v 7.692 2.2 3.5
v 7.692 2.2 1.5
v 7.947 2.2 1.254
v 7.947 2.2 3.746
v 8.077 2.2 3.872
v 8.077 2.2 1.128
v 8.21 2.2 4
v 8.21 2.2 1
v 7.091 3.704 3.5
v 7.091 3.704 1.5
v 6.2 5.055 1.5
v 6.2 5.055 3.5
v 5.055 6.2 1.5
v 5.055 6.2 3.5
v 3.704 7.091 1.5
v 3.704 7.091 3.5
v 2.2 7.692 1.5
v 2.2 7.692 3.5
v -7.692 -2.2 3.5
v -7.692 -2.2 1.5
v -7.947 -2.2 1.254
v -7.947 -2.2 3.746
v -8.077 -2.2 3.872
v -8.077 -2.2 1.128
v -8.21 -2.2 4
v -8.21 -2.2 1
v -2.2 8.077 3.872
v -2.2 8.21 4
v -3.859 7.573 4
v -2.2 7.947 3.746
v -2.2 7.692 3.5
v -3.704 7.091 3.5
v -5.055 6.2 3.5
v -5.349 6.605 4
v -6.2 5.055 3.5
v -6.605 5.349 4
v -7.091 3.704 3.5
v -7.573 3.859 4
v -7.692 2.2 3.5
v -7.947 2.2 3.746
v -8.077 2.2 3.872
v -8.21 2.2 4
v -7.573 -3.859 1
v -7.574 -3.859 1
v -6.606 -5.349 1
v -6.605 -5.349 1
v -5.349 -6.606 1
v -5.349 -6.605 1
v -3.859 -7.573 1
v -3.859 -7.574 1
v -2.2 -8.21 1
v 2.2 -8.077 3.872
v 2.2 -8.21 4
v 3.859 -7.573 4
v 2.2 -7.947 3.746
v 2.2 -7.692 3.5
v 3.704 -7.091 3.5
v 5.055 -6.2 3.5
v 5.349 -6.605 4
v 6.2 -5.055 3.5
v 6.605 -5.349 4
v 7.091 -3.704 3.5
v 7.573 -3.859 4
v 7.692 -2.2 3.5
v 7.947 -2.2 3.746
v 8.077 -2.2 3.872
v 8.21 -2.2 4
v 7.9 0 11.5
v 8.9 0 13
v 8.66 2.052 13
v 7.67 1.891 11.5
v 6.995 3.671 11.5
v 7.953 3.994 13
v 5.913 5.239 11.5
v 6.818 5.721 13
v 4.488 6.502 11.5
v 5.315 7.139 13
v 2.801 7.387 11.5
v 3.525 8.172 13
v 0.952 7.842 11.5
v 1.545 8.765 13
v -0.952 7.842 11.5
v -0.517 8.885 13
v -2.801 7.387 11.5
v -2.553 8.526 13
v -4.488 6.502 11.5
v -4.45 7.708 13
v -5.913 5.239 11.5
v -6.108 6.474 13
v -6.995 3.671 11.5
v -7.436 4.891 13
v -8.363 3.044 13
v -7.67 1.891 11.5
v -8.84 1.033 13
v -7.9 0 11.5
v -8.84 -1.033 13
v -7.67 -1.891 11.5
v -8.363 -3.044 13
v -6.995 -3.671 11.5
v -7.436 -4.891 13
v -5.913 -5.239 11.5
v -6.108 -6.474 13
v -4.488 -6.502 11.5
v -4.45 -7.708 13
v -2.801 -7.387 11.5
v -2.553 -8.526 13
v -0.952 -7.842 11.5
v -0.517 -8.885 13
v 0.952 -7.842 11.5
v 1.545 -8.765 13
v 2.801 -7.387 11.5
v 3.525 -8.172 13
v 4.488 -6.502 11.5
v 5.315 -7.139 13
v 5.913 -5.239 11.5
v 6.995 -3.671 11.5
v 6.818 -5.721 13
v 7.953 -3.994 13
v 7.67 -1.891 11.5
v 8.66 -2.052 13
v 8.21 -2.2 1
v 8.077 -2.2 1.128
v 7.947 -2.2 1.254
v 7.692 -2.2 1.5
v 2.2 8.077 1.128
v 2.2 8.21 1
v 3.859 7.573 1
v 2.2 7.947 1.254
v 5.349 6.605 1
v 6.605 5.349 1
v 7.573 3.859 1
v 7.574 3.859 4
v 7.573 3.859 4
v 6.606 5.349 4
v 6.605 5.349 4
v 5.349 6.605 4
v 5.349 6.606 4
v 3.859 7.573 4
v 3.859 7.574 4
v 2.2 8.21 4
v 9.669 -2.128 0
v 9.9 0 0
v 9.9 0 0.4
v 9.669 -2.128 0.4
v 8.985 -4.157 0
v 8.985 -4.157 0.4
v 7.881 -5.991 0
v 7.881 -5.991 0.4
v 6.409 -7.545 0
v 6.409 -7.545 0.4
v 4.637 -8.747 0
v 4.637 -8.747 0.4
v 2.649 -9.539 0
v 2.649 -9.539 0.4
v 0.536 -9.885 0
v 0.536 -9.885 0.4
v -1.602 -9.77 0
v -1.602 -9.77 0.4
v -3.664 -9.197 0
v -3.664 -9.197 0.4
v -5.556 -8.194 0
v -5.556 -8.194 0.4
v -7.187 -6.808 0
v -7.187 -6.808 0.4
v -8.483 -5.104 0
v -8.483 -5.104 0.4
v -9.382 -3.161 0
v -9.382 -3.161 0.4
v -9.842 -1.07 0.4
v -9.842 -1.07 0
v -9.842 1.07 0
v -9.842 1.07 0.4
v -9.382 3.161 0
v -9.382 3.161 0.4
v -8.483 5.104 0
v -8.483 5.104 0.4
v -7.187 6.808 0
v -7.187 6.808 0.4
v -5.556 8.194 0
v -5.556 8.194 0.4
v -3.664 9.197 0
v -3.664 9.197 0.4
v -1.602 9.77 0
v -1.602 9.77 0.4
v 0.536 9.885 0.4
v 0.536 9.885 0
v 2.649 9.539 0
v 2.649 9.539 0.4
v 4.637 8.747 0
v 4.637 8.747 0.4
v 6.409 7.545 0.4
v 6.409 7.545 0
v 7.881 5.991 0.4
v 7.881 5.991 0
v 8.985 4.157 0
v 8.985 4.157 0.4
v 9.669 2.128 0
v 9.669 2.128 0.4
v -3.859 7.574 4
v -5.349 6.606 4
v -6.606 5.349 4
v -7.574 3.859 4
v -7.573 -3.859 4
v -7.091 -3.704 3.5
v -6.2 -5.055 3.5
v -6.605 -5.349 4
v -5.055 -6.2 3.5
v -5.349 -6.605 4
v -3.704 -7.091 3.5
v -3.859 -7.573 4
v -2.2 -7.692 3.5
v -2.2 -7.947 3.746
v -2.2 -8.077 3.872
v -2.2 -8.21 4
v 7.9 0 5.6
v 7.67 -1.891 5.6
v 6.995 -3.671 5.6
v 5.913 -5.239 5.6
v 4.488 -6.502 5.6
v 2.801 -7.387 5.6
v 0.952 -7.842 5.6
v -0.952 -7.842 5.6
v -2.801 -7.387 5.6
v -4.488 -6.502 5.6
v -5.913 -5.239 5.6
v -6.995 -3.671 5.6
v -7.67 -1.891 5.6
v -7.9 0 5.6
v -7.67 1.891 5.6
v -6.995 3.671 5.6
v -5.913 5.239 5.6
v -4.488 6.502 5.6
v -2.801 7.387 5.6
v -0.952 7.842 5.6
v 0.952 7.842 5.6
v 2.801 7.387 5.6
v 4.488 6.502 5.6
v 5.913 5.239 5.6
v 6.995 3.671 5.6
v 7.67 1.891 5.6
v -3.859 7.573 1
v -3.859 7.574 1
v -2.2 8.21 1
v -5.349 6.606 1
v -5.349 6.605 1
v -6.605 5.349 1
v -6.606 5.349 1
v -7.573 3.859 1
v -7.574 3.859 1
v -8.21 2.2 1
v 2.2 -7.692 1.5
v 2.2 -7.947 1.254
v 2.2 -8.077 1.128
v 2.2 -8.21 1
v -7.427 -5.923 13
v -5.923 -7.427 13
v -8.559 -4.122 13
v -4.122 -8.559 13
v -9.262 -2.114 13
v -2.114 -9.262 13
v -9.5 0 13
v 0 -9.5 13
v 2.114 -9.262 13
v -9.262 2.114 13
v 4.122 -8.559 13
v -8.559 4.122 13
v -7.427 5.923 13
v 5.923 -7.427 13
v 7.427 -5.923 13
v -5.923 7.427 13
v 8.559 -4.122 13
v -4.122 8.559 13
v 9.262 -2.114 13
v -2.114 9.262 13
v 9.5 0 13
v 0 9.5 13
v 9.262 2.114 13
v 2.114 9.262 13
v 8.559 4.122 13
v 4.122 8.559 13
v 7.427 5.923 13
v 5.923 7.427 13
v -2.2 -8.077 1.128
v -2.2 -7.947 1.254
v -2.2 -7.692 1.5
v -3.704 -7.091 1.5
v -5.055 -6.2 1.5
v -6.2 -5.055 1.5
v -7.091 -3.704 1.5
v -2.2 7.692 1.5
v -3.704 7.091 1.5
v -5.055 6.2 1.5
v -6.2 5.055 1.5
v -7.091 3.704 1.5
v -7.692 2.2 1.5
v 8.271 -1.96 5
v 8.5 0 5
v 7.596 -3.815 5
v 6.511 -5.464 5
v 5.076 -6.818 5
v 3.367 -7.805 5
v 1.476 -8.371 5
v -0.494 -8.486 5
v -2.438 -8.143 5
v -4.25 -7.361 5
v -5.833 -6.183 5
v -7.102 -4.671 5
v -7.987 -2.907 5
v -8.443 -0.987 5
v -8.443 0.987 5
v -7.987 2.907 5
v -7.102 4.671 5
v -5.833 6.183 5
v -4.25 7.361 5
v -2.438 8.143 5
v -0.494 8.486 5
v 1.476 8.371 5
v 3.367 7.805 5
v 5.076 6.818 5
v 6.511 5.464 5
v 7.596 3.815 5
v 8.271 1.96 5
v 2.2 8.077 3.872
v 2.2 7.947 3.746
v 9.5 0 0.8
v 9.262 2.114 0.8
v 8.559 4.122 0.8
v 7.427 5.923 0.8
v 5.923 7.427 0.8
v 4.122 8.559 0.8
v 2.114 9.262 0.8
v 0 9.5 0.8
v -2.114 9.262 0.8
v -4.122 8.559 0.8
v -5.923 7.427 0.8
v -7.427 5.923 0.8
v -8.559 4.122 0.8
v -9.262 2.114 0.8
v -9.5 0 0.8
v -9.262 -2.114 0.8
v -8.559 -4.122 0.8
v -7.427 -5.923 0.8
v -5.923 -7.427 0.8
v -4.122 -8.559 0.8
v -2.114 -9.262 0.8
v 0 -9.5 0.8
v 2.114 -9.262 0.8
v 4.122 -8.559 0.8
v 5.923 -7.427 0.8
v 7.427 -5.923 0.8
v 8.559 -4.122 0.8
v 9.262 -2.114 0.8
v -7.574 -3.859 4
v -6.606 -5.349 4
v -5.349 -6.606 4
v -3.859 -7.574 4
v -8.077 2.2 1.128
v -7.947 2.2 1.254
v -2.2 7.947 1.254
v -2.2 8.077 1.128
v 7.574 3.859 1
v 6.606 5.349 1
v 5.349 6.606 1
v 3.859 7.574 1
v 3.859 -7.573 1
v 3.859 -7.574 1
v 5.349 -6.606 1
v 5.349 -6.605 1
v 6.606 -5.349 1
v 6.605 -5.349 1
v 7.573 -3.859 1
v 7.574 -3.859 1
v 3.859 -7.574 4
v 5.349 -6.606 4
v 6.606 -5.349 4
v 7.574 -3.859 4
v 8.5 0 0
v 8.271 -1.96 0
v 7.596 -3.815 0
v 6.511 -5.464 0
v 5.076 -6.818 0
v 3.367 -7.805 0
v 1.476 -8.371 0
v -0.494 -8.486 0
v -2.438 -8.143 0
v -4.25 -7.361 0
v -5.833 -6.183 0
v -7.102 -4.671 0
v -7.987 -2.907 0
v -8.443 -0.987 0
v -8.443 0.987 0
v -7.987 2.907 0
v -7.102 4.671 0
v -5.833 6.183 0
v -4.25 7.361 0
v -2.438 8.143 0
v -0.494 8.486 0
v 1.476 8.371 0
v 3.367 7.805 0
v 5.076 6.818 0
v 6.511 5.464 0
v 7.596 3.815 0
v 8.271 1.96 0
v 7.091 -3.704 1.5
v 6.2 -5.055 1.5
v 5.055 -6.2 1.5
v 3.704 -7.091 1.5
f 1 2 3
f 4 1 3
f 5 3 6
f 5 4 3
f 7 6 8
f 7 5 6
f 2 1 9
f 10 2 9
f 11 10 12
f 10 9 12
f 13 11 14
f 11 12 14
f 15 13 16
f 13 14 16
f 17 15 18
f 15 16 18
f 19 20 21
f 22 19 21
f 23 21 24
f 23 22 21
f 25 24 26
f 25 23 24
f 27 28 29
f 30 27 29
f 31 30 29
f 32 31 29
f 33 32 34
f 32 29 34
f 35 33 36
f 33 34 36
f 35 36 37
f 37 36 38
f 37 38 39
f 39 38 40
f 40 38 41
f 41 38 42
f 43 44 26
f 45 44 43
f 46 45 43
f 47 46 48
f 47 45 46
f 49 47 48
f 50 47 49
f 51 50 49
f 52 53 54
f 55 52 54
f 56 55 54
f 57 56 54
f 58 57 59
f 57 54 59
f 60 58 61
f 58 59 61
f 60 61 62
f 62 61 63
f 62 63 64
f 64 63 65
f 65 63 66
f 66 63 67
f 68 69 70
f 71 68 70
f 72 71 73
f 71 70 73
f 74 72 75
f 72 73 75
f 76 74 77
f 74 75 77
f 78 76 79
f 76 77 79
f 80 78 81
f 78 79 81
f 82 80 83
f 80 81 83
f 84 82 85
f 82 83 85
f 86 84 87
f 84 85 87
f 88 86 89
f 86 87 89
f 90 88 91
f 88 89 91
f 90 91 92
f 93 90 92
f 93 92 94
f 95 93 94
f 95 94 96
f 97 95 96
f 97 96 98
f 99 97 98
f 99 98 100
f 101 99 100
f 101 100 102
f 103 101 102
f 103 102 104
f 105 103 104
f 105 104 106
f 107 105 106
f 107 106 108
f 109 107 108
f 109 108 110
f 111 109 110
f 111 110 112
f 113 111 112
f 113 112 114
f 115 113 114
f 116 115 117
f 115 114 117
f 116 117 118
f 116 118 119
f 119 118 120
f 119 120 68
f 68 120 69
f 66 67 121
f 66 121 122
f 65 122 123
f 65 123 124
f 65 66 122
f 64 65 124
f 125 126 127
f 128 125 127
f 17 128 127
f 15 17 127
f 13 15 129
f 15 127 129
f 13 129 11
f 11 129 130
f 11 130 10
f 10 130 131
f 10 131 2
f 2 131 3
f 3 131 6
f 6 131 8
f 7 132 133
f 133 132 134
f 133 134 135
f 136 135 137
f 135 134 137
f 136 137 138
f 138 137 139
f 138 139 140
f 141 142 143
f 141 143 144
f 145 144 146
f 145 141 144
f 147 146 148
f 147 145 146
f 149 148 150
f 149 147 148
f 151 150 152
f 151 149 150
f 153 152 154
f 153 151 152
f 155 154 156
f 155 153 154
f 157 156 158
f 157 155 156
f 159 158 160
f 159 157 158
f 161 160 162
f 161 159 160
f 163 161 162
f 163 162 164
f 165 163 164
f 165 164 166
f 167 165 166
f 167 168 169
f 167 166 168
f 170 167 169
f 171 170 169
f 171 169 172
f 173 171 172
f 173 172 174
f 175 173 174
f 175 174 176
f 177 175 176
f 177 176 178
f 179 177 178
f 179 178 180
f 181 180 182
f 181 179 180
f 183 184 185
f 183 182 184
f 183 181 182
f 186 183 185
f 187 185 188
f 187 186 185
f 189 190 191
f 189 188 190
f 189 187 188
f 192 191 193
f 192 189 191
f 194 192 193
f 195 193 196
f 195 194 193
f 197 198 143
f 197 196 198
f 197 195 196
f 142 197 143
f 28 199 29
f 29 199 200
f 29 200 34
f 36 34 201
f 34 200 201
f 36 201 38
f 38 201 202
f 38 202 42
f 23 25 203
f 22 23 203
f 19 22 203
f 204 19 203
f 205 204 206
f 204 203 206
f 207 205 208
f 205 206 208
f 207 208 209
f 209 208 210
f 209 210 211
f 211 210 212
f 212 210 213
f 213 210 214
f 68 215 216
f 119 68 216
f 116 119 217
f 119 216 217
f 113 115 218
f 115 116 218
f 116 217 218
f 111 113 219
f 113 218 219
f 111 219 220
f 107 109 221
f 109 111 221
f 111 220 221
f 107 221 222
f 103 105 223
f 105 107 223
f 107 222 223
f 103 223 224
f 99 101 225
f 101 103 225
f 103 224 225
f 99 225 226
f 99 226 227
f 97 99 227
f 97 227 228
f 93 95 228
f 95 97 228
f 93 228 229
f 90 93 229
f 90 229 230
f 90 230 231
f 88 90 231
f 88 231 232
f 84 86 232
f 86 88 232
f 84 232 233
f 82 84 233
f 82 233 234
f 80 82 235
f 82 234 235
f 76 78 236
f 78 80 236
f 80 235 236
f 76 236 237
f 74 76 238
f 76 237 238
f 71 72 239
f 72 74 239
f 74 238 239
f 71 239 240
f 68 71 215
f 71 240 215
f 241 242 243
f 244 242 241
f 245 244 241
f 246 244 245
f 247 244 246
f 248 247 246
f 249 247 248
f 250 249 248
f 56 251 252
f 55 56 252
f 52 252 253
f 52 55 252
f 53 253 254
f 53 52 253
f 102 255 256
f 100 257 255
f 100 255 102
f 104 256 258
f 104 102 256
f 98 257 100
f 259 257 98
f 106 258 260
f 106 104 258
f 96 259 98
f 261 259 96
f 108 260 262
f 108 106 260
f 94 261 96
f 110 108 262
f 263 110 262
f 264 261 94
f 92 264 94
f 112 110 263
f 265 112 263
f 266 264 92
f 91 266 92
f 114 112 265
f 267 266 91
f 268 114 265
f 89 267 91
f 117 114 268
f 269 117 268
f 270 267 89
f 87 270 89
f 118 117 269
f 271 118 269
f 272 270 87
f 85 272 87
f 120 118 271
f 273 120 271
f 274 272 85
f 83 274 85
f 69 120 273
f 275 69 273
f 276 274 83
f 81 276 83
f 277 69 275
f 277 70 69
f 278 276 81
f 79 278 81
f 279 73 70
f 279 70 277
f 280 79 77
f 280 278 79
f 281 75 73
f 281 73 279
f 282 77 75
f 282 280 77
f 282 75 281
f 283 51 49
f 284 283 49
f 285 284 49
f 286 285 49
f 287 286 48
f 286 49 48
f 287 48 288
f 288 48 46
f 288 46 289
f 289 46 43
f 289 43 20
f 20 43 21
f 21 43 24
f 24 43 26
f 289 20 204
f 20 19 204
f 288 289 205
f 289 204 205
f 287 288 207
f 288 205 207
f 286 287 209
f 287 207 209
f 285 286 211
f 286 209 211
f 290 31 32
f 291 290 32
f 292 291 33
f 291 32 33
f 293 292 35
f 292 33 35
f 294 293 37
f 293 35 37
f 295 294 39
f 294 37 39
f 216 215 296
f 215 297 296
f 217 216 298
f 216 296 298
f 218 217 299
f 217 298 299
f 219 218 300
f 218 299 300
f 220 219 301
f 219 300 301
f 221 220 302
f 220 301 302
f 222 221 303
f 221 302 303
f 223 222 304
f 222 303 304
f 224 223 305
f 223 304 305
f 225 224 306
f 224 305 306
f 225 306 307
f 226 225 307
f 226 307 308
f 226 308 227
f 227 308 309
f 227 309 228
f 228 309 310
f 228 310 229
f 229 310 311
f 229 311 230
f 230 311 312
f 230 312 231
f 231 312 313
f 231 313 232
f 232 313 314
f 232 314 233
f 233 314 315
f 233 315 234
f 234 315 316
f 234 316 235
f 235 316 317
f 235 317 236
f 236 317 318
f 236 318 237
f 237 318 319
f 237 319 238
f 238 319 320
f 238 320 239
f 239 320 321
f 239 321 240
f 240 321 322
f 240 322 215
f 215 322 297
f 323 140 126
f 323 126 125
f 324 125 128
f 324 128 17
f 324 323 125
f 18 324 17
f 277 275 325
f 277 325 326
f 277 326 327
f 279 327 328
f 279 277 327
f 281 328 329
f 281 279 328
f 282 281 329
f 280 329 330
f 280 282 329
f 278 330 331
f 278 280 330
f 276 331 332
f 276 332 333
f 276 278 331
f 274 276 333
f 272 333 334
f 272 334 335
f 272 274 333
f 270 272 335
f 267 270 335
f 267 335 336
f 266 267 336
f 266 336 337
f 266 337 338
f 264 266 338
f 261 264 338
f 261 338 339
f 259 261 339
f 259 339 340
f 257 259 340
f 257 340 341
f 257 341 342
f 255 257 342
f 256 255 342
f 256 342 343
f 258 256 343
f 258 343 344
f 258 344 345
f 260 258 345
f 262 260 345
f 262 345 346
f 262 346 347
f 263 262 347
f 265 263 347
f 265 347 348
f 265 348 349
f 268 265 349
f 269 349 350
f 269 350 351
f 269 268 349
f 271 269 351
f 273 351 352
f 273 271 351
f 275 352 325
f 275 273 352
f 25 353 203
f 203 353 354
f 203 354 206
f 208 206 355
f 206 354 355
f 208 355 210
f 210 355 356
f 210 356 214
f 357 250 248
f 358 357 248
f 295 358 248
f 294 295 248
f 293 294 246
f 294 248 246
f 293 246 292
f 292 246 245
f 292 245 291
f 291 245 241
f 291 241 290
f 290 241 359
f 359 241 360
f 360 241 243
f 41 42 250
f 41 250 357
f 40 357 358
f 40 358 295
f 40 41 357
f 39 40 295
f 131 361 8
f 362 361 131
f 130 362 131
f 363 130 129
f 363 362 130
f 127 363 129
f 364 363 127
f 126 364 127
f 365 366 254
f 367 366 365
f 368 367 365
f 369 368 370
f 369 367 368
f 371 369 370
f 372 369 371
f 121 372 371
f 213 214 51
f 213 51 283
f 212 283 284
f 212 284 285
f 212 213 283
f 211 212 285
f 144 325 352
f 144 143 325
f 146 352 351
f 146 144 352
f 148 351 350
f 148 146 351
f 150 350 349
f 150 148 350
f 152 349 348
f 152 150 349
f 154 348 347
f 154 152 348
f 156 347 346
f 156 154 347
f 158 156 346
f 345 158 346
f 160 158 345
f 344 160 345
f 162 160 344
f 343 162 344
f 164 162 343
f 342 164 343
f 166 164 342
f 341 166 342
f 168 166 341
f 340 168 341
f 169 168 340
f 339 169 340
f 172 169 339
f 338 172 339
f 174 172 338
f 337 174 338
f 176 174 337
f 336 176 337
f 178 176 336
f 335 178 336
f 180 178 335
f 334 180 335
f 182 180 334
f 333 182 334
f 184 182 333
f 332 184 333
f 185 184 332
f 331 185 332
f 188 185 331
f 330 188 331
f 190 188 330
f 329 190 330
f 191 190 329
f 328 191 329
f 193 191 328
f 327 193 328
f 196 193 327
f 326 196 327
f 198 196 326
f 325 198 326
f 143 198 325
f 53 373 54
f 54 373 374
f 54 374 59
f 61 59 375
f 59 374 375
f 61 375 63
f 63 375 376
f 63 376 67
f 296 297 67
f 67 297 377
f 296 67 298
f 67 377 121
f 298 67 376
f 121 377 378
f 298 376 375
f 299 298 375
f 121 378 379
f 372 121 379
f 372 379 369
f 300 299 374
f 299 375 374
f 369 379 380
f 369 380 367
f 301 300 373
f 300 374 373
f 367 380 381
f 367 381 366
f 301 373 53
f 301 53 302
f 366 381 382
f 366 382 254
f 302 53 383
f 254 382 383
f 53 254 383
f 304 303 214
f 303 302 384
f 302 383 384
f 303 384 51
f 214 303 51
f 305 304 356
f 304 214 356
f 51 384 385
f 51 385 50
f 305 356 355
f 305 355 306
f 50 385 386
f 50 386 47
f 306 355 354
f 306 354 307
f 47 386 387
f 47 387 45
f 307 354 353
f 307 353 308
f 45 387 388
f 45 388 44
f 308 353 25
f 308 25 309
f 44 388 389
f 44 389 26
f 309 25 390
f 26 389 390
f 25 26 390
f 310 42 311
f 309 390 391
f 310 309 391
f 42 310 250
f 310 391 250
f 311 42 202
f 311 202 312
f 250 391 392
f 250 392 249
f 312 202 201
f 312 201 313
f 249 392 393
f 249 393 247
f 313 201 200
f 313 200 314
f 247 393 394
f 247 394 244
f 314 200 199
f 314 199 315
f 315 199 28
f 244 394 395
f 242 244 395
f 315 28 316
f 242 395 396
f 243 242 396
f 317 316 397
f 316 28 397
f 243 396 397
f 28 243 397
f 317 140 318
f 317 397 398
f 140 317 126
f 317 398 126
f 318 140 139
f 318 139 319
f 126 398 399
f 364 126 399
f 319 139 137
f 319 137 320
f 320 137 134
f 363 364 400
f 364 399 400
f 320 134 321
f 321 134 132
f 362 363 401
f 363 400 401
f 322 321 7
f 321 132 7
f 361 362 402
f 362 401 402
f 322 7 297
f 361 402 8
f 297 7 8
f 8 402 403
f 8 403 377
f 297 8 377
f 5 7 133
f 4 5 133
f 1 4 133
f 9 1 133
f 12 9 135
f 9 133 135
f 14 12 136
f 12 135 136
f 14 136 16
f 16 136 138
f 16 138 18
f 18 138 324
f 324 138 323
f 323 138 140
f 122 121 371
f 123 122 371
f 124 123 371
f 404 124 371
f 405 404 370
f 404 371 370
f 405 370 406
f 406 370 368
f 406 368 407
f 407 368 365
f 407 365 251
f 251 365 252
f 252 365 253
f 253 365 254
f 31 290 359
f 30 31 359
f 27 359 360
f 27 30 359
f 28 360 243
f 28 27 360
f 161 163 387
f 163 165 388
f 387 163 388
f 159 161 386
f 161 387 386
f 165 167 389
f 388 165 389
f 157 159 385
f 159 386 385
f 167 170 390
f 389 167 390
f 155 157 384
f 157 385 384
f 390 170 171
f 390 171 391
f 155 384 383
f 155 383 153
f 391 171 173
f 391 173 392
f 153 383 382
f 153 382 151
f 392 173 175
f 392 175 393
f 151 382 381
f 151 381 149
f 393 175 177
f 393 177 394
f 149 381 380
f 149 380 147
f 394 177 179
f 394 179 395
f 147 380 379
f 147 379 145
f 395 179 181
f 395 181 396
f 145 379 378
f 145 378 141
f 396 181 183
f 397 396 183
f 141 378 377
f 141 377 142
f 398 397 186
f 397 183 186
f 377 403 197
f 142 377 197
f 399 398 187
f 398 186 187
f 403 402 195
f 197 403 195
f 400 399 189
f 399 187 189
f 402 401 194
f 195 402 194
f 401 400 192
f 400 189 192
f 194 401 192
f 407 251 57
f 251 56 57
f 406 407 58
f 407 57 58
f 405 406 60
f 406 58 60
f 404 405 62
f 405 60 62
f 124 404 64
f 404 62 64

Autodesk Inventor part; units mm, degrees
ref_plane "YZ Plane" through (0, 0, 0) normal (1, 0, 0) x (0, 1, 0)
ref_plane "XZ Plane" through (0, 0, 0) normal (0, 1, 0) x (-1, 0, 0)
ref_plane "XY Plane" through (0, 0, 0) normal (0, 0, 1) x (1, 0, 0)
sketch "Sketch1" plane through (0, 0, 0) normal (0, 1, 0) x (-1, 0, 0)
  line L0 (0, 0) -> (0, 13)
  line L1 (-8.9, 13) -> (-7.9, 11.5)
  line L2 (-7.9, 11.5) -> (-7.9, 5.6)
  line L3 (-7.9, 5.6) -> (-8.5, 5)
  line L4 (-8.5, 5) -> (-8.5, 0)
  line L5 (-8.5, 0) -> (-9.5, 0)
  line L6 (-9.5, 0) -> (-9.5, 13)
  line L7 (-9.5, 13) -> (-8.9, 13)
  line L8 (-9.5, 0.8) -> (-9.9, 0.4)
  line L9 (-9.9, 0.4) -> (-9.9, 0)
  line L10 (-9.9, 0) -> (-9.5, 0)
  dimension "d0" = 15.8
  dimension "d1" = 5
  dimension "d2" = 19
  dimension "d3" = 1
  dimension "d4" = 1.5
  dimension "d5" = 8
  dimension "d6" = 17
  dimension "d7" = 45
  dimension "d9" = 0.8
  dimension "d10" = 0.4
  dimension "d11" = 0.4
revolve "Revolution1" add sketch "Sketch1" angle 360 about axis through (0, 0, 0) along (0, 0, 1)
ref_plane "Work Plane1" through (0, 0, 2.5) normal (0, 0, -1) x (-1, 0, 0)
sketch "Sketch2" plane through (0, 0, 2.5) normal (0, 0, -1) x (-1, 0, 0)
  circle A0 centre (0, 0) radius 8.5 projected
  line L0 (-2.2, 8.2104) -> (-2.2, 7.6916)
  arc A1 (-2.2, 7.6916) -> (-7.6916, 2.2) centre (0, 0) ccw
  line L1 (-7.6916, 2.2) -> (-8.2104, 2.2)
  dimension "d14" = 60
  dimension "d15" = 0.5
extrude "Extrusion1" add sketch "Sketch2" along normal mid plane 3 contours L0 A1 L1 A0 picked at (-5.6701, 6.0517)
chamfer "Chamfer1" distance 0.5 angle 45 2 edges at (5.6569, 5.6569, 4) (5.6569, 5.6569, 1)
pattern_circular "Circular Pattern1" count 4 over 360 about axis through (0, 0, -10) along (0, 0, 1) of "Extrusion1", "Chamfer1"
properties part number "screw-grip_3DPrint"
